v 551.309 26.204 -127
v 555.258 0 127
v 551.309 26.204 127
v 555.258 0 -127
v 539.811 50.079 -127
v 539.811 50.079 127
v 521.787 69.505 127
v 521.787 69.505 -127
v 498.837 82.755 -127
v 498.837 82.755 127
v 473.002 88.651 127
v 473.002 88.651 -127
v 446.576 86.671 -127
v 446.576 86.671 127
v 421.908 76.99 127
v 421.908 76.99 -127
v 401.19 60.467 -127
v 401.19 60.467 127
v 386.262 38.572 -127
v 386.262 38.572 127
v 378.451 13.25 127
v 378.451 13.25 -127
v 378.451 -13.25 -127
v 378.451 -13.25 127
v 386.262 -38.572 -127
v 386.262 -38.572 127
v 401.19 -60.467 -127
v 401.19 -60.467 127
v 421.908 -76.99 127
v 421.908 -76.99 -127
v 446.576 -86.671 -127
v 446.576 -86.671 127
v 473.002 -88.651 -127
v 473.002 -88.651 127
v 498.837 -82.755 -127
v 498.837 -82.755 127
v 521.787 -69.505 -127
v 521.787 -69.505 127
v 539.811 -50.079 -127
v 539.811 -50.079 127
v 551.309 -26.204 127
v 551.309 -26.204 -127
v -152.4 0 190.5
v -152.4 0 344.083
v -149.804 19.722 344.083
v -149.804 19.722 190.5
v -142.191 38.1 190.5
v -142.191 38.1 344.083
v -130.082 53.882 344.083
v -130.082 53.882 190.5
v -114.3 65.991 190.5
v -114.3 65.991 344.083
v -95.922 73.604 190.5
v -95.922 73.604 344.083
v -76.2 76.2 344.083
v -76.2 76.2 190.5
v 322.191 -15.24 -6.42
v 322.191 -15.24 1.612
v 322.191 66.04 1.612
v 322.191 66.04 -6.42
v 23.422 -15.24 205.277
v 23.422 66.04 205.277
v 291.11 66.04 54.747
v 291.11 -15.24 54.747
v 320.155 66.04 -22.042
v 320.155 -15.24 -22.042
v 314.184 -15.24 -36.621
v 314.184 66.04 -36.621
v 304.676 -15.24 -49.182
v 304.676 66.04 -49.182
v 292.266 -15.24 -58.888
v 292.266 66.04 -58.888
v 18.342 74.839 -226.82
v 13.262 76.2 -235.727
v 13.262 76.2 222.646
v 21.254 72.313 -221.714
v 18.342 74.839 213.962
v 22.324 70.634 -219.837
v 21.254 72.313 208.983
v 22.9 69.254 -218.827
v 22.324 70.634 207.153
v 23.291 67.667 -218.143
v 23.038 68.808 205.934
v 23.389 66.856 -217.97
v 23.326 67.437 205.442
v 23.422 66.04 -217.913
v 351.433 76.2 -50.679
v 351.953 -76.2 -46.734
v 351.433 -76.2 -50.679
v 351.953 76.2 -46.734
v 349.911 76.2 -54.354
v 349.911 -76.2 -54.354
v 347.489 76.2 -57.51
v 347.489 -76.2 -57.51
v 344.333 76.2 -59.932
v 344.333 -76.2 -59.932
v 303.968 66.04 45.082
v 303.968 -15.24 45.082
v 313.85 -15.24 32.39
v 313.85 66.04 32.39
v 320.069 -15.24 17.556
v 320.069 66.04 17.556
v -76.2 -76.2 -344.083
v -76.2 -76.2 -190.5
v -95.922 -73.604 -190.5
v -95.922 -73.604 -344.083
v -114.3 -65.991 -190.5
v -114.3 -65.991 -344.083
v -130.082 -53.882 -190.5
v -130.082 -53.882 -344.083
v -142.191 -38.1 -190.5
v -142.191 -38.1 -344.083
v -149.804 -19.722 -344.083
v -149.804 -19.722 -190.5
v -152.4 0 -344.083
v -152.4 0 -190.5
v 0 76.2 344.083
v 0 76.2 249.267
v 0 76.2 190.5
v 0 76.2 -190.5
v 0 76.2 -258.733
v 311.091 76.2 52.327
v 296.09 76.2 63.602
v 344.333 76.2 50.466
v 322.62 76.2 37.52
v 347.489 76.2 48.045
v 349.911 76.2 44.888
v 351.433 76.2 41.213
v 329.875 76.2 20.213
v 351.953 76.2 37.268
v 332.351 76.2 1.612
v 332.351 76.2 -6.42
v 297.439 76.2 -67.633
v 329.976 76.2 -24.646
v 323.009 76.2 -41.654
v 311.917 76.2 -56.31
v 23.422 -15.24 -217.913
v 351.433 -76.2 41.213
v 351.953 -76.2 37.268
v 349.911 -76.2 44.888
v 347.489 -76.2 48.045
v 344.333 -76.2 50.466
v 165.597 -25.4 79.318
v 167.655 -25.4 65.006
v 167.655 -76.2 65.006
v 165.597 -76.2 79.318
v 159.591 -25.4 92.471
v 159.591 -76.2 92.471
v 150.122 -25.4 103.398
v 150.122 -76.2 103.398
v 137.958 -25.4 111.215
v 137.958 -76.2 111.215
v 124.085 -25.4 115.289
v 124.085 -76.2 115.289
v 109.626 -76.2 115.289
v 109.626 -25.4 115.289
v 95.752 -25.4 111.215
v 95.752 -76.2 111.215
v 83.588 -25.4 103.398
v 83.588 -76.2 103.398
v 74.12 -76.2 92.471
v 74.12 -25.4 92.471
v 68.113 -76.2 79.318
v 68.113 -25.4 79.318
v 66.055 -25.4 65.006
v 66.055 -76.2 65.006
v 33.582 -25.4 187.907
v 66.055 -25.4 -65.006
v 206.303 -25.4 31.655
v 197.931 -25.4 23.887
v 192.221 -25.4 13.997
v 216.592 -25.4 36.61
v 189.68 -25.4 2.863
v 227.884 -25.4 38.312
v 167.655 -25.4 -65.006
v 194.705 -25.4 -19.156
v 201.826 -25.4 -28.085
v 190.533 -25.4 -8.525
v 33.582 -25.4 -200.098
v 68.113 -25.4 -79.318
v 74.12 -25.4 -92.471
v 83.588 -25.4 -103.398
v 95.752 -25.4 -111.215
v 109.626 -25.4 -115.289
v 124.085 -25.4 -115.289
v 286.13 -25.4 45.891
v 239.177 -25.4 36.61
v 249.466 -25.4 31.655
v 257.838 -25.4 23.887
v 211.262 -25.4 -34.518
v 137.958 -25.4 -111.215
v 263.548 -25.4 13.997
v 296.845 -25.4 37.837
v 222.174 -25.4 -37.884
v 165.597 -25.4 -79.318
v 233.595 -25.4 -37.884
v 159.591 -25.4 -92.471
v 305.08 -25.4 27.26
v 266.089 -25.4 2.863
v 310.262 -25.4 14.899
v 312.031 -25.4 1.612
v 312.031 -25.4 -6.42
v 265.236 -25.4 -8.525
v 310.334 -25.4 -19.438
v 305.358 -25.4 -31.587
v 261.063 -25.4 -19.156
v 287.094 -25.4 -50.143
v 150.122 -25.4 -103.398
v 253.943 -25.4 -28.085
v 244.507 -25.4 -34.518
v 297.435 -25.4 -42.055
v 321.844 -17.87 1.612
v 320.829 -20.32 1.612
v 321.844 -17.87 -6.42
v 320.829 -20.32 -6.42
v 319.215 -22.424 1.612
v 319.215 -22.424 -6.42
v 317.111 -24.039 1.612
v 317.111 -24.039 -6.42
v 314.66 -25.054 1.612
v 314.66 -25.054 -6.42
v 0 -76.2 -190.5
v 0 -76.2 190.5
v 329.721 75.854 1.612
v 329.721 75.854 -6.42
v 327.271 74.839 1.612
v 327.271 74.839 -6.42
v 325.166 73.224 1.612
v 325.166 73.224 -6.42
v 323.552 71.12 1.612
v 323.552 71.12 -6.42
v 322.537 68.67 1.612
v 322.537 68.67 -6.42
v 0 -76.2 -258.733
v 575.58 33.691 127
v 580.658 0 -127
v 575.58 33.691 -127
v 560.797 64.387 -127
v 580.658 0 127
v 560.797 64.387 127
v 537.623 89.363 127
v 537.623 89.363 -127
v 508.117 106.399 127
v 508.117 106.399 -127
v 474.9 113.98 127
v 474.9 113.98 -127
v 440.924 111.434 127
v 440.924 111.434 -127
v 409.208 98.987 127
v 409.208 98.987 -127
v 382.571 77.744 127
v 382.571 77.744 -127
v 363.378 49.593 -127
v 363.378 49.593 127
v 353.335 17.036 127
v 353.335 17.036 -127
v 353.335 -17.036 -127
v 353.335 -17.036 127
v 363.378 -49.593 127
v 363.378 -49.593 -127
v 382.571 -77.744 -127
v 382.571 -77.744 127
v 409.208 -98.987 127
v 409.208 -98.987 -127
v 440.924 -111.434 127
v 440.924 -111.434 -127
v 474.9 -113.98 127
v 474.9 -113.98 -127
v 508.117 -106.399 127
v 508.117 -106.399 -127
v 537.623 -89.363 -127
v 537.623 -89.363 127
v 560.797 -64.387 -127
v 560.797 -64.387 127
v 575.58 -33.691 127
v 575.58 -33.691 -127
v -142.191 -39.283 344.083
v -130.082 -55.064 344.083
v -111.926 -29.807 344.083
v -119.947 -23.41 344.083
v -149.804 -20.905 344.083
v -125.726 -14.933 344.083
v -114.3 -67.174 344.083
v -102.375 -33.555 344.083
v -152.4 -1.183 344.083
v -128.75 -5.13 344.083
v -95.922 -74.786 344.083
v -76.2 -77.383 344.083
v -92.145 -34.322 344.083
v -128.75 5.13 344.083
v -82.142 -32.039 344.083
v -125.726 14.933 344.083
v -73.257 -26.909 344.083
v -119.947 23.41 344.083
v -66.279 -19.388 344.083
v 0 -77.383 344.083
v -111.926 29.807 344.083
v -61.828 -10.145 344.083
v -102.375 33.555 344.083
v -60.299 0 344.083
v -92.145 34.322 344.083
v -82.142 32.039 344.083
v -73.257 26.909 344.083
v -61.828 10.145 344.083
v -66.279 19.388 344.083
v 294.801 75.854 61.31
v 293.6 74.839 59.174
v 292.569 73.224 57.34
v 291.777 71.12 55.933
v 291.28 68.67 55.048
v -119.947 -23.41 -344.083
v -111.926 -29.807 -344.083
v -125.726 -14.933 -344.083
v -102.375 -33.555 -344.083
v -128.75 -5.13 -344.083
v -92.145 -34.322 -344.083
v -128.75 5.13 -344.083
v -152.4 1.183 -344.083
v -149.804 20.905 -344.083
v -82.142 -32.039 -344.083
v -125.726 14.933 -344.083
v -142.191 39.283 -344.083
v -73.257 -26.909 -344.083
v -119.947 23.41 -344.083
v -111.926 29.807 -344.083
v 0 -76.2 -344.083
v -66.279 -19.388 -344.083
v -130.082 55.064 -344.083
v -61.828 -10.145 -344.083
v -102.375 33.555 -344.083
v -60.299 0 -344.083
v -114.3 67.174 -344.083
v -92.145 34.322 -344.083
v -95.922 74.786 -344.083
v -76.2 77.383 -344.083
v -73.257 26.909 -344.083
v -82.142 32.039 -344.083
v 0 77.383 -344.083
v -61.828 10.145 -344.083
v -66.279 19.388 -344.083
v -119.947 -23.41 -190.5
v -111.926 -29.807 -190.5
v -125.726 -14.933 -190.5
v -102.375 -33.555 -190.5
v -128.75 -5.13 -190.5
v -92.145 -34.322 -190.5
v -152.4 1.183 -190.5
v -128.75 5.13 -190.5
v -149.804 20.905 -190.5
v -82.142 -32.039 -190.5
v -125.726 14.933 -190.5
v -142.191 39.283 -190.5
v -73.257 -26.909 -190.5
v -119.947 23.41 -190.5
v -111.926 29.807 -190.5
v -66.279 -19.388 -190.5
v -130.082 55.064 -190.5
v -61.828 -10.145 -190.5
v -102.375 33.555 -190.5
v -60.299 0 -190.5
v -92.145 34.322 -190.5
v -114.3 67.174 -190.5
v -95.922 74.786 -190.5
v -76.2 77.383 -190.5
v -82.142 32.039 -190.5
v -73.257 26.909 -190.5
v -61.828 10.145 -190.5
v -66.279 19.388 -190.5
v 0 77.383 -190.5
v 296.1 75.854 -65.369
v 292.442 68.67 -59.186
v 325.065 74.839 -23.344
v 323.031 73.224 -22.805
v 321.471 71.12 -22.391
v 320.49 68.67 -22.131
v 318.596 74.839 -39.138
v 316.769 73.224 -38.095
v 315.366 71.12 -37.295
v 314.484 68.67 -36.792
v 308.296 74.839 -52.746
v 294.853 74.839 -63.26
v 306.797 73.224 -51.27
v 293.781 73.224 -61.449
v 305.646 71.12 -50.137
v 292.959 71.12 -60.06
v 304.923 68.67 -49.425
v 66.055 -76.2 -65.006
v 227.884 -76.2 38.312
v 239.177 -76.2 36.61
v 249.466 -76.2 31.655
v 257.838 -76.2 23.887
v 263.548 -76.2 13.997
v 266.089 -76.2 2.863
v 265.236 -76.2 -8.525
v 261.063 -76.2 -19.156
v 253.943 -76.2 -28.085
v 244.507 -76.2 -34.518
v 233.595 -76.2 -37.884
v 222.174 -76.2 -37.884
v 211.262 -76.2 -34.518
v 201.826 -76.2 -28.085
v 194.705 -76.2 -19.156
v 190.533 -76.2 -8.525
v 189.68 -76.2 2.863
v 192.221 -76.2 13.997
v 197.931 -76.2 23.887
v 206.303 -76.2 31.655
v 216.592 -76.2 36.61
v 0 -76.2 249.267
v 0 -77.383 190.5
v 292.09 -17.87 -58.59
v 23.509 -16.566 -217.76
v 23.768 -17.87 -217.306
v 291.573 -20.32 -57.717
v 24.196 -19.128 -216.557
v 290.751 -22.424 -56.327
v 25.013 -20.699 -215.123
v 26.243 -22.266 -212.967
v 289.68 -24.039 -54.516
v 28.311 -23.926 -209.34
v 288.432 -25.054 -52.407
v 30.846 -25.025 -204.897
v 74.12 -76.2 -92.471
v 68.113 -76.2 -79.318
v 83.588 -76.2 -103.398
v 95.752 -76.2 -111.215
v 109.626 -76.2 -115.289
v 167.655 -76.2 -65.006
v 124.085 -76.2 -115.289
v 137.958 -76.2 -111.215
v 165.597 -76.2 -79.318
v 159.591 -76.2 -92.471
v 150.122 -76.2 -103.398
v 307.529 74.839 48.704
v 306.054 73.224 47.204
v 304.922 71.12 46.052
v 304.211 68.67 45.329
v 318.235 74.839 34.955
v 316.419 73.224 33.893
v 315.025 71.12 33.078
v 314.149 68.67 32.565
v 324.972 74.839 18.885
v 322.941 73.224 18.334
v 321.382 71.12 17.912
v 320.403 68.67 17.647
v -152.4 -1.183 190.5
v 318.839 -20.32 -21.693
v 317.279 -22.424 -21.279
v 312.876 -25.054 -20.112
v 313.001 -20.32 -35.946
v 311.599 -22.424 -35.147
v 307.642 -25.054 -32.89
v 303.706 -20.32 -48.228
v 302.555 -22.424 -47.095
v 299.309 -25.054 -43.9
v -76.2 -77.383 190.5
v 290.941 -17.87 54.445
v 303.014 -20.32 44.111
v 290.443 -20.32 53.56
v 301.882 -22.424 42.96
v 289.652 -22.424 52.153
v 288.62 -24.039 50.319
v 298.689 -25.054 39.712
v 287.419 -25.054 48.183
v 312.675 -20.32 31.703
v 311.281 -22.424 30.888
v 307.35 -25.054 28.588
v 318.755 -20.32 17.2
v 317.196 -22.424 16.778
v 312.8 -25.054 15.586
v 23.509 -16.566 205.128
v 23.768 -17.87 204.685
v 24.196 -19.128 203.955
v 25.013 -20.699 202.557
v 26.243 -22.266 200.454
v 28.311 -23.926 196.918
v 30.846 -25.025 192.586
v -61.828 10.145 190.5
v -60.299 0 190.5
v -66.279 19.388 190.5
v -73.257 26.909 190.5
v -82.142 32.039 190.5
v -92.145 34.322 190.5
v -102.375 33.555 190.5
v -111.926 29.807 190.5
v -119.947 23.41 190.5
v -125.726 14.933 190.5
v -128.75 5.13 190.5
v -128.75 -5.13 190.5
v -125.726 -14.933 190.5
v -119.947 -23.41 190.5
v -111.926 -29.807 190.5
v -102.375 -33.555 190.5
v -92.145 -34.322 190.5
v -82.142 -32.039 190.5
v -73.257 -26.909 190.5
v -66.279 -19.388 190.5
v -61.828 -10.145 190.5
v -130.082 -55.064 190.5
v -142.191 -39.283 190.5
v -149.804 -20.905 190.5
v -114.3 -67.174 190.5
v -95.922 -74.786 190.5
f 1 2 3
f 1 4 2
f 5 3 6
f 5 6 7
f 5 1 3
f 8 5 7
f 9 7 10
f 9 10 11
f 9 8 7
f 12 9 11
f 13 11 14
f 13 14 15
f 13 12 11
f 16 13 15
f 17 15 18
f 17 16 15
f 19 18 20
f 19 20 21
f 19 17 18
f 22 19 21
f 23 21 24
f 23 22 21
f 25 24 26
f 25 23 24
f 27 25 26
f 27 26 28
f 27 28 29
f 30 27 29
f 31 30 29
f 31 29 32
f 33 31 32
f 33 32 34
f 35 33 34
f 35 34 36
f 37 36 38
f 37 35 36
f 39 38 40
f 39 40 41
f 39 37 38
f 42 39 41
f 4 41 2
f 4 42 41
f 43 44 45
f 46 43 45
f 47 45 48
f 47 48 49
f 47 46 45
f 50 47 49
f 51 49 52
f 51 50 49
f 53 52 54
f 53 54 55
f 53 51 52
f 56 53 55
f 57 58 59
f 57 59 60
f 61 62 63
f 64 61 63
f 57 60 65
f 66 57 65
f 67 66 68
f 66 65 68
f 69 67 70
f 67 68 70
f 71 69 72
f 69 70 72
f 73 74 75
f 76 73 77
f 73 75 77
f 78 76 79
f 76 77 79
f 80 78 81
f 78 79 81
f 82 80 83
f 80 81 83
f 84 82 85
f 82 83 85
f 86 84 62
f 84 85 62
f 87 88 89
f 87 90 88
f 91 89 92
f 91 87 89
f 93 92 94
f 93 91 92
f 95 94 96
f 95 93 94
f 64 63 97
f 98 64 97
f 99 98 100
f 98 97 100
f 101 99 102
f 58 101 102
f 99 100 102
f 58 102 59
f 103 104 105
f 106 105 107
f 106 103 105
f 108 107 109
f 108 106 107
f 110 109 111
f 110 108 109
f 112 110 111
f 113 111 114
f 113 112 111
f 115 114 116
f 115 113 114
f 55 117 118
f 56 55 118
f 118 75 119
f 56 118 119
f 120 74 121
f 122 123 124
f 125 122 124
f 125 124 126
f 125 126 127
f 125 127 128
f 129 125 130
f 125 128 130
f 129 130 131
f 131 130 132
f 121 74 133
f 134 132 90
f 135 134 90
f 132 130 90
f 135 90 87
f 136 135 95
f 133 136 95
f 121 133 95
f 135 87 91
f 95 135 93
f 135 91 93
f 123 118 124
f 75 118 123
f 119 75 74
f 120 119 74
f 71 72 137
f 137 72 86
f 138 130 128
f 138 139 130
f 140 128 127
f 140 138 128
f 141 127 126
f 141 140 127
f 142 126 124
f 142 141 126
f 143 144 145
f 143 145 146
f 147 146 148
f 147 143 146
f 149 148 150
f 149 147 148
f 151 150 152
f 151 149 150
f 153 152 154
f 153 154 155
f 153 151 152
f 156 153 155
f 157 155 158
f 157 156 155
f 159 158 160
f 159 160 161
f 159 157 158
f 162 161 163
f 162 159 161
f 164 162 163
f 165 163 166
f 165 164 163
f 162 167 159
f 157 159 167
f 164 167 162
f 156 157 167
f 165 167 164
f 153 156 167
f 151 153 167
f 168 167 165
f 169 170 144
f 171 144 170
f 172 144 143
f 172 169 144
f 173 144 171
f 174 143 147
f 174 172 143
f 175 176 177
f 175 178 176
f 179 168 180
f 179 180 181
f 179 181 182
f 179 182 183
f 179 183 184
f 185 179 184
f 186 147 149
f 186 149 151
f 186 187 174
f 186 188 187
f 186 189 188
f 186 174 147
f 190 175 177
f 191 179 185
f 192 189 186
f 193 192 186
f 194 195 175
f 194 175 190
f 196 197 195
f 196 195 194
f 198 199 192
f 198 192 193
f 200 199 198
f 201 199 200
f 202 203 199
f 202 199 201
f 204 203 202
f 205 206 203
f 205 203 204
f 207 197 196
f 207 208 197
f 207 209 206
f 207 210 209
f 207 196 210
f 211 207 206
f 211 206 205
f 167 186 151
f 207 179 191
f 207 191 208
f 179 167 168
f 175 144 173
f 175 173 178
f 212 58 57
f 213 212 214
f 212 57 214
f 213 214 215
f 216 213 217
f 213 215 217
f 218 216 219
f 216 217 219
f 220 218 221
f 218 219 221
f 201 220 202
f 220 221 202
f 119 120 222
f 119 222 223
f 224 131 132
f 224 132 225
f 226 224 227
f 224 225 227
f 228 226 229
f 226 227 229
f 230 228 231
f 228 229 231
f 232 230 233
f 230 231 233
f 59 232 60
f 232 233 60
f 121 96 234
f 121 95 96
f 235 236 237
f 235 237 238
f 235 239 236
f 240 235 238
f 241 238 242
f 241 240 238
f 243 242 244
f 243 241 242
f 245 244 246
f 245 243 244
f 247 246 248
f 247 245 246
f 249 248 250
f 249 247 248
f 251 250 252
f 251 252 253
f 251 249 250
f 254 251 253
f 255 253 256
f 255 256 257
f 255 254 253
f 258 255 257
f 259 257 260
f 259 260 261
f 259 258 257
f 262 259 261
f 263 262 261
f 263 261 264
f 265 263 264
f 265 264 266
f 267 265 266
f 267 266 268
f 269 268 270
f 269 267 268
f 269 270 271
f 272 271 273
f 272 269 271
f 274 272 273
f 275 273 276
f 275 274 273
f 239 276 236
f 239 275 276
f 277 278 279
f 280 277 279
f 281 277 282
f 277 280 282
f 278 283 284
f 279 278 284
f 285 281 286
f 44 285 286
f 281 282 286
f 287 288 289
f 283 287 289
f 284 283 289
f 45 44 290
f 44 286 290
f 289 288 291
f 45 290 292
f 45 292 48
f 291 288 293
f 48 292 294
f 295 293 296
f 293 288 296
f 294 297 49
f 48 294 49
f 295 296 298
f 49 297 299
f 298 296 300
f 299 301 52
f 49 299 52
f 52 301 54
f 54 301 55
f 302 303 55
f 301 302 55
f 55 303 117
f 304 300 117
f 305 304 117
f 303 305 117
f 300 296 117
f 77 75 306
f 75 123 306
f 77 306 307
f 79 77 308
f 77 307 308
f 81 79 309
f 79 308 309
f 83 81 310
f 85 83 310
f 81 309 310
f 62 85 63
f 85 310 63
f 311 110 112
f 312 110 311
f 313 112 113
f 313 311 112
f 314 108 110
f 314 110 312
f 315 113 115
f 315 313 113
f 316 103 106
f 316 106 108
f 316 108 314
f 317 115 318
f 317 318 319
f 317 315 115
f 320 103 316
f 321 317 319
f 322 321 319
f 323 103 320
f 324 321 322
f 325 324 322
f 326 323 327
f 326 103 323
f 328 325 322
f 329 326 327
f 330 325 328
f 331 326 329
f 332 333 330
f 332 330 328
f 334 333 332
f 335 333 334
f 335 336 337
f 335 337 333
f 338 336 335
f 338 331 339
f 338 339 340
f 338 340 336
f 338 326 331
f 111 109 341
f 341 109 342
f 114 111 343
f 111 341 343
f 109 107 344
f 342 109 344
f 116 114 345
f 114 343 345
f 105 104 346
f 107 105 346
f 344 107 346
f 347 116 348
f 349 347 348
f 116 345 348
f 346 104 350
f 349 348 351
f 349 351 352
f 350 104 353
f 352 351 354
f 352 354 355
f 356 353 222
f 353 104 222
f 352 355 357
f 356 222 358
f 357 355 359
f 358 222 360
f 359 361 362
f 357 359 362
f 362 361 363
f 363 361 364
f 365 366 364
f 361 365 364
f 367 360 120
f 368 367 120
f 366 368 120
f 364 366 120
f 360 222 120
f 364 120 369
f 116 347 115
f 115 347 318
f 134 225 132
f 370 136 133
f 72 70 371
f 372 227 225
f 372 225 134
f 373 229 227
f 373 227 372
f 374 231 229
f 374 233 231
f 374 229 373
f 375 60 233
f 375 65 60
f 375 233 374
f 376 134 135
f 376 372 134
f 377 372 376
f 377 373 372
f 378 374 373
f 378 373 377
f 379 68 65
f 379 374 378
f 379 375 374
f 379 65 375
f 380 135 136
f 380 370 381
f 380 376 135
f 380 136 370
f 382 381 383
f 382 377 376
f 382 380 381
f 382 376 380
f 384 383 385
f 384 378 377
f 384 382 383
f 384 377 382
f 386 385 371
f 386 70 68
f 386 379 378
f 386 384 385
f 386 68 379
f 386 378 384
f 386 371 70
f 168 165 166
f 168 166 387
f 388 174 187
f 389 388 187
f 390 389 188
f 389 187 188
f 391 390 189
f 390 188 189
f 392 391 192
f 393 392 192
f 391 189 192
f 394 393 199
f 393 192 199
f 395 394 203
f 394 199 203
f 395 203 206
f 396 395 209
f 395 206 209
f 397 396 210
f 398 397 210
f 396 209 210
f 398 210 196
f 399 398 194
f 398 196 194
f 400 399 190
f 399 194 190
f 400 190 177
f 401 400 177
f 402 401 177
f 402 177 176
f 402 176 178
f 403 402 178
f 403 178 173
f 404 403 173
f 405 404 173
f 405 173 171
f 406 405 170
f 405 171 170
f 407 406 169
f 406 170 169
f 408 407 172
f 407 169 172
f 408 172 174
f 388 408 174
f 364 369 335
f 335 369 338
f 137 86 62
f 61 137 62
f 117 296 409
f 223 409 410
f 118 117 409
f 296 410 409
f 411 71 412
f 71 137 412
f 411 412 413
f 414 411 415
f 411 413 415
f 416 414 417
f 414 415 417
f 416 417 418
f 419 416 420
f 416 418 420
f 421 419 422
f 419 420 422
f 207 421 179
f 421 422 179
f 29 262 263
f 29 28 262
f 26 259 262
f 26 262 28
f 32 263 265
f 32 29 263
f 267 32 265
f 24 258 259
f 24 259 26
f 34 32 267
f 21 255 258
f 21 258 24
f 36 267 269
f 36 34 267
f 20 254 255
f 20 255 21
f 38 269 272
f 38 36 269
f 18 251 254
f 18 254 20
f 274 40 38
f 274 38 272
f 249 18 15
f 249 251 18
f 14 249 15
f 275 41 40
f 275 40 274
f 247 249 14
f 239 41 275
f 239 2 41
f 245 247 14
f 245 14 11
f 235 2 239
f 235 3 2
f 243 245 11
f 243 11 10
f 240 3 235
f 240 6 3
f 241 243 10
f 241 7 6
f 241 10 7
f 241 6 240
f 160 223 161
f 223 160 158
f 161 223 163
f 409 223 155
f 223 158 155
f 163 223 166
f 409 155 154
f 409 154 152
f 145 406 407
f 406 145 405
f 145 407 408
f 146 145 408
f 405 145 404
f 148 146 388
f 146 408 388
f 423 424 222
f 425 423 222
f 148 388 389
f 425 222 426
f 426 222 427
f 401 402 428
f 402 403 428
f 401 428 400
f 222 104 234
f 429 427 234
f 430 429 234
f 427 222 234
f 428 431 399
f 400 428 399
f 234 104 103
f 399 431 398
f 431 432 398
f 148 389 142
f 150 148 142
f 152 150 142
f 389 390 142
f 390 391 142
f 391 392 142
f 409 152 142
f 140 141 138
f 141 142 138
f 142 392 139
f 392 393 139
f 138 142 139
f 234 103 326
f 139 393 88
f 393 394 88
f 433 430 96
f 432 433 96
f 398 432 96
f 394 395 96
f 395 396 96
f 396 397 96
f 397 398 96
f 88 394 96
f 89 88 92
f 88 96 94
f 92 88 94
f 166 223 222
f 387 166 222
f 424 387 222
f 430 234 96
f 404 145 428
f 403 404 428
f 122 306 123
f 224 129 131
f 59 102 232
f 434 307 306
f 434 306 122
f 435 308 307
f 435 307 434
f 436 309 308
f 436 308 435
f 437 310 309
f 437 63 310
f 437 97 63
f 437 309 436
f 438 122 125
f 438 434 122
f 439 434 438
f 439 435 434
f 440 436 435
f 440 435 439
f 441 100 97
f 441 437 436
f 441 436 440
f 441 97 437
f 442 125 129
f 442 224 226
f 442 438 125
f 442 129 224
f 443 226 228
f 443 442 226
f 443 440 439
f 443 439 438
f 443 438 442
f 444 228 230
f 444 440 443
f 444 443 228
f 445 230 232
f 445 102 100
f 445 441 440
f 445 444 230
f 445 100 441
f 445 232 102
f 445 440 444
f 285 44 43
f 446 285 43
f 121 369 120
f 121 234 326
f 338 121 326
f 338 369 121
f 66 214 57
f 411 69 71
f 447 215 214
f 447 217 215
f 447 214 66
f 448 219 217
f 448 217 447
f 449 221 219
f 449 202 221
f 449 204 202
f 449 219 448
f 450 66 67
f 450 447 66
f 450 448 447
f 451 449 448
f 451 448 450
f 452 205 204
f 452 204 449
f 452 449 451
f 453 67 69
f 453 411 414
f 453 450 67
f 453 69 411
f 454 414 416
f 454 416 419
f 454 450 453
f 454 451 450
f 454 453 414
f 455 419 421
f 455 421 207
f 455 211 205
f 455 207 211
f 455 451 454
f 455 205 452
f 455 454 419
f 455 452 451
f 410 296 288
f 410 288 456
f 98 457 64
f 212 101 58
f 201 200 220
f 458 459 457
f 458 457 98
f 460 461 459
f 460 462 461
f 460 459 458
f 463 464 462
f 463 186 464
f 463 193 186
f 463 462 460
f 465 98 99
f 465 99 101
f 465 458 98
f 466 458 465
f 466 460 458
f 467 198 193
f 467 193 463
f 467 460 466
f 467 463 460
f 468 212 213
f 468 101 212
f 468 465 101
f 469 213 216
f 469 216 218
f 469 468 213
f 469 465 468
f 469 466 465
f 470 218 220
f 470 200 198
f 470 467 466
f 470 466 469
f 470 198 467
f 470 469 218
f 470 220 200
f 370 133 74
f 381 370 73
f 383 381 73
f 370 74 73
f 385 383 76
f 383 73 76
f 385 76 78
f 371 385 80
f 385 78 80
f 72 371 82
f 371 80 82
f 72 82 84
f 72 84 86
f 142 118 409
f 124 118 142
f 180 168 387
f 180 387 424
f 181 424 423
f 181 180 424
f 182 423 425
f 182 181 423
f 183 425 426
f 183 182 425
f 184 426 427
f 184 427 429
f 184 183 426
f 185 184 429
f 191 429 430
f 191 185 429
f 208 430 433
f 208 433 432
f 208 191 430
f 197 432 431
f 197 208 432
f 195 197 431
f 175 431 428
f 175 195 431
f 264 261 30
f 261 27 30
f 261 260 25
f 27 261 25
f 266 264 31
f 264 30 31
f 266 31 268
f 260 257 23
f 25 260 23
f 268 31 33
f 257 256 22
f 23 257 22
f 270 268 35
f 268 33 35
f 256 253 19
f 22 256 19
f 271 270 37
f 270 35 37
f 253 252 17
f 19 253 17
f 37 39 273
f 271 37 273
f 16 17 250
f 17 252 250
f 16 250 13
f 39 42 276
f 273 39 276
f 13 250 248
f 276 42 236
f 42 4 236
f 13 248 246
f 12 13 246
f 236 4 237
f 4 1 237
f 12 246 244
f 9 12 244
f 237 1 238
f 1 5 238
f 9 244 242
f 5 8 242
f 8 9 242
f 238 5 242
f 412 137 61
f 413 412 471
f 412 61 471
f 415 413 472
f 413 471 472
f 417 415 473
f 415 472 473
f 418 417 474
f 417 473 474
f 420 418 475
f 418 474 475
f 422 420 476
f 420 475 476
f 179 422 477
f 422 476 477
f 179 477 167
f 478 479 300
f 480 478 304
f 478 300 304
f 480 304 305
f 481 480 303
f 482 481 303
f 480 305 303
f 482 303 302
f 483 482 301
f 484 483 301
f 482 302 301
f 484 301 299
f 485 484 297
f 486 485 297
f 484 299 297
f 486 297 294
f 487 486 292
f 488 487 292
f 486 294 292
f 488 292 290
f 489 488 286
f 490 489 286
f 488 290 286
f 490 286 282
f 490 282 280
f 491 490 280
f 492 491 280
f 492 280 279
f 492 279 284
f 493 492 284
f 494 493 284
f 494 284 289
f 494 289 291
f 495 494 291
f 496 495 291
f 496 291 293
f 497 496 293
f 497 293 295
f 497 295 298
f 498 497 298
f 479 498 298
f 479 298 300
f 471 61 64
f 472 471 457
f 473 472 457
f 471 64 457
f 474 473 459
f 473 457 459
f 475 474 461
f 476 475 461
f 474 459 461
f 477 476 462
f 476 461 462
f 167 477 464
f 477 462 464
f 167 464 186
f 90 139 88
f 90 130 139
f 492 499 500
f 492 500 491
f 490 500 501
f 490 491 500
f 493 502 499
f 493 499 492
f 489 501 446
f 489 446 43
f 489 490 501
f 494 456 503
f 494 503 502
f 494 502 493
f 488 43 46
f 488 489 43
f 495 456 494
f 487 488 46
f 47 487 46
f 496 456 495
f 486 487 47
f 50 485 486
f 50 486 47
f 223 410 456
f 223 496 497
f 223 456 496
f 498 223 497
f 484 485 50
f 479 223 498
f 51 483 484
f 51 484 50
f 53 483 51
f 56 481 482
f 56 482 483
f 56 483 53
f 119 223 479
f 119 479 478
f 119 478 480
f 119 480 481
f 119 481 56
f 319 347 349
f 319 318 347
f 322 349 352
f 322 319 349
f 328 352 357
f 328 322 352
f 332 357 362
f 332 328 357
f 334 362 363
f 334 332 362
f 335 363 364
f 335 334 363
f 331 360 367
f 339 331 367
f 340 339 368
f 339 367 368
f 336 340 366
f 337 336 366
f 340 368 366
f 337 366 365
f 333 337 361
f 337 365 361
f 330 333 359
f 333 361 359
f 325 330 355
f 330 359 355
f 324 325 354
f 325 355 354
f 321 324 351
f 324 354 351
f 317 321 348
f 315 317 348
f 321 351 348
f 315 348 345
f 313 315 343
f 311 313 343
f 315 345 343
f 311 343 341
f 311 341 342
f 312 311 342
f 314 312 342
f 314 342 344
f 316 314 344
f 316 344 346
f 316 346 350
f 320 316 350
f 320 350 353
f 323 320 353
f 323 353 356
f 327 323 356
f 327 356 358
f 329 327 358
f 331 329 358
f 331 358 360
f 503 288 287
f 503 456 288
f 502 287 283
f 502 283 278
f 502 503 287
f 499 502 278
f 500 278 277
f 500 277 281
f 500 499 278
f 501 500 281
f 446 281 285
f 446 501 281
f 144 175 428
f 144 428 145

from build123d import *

# Parameters (mm, degrees)
BOSS_EXTRUDE1_DEPTH = 76.2
CUT_EXTRUDE1_DEPTH  = 101.6
SKETCH4_R           = 38.311860733
CUT_EXTRUDE2_DEPTH  = 50.8
FILLET1_R           = 10.16
SKETCH5_R           = 114.3
SKETCH5_R_2         = 88.9
BOSS_EXTRUDE2_DEPTH = 127
FILLET2_R           = 15.24
SKETCH7_W           = 153.582797675
SKETCH7_H           = 153.582797675
BOSS_EXTRUDE3_DEPTH = 152.4
SKETCH8_R           = 34.418137162
CUT_EXTRUDE3_DEPTH  = 778.002
FILLET3_R           = 76.2


with BuildPart() as part:
    # Sketch2 → Boss-Extrude1 (new, symmetric)
    with BuildSketch(Plane(origin=(0, 0, 0), x_dir=(1, 0, 0), z_dir=(0, 1, 0))):
        Polygon((351.952724098, -46.067080745), (351.952724098, 55.532919255), (0, 258.732919255), (0, -249.267080745), align=None)
    extrude(amount=BOSS_EXTRUDE1_DEPTH, both=True)

    # Sketch3 → Cut-Extrude1 (cut)
    with BuildSketch(Plane(origin=(0, 76.2, 0), x_dir=(1, 0, 0), z_dir=(0, 1, 0))):
        with BuildLine():
            Line((23.422147566, 217.912574818), (23.422147566, -205.276778605))
            Line((23.422147566, -205.276778605), (291.110294463, -54.746573984))
            ThreePointArc((291.110294463, -54.746573984), (313.849973398, -32.39028517), (322.190661125, -1.611565641))
            Line((322.190661125, -1.611565641), (322.190661125, 6.419861947))
            ThreePointArc((322.190661125, 6.419861947), (314.18370897, 36.620794448), (292.266241049, 58.888084508))
            Line((292.266241049, 58.888084508), (23.422147566, 217.912574818))
        make_face()
    extrude(amount=-CUT_EXTRUDE1_DEPTH, mode=Mode.SUBTRACT)

    # Sketch4 → Cut-Extrude2 (cut)
    with BuildSketch(Plane(origin=(0, -25.4, 0), x_dir=(1, 0, 0), z_dir=(0, 1, 0))):
        with Locations(Location((227.884419444, 0, 0), (0, 0, 270))):
            Circle(SKETCH4_R)
        with BuildLine():
            Line((167.655223077, 65.006150223), (167.655223077, -65.006150223))
            ThreePointArc((167.655223077, -65.006150223), (116.855223077, -115.806150223), (66.055223077, -65.006150223))
            Line((66.055223077, -65.006150223), (66.055223077, 65.006150223))
            ThreePointArc((66.055223077, 65.006150223), (116.855223077, 115.806150223), (167.655223077, 65.006150223))
        make_face()
    extrude(amount=-CUT_EXTRUDE2_DEPTH, mode=Mode.SUBTRACT)

    # Fillet1
    fillet1_edges = [part.edges().sort_by_distance(p)[0] for p in [
        (157.844194307, -25.4, -138.400329663),
        (314.18370897, -25.4, -36.620794448),
        (322.190661125, -25.4, -2.404148153),
        (313.849973398, -25.4, 32.39028517),
        (157.266221015, -25.4, 130.011676294),
        (23.422147566, -25.4, -6.317898106),
        (157.844194307, 76.2, -138.400329663),
        (23.422147566, 76.2, -6.317898106),
        (157.266221015, 76.2, 130.011676294),
        (313.849973398, 76.2, 32.39028517),
        (322.190661125, 76.2, -2.404148153),
        (314.18370897, 76.2, -36.620794448),
    ]]
    fillet(fillet1_edges, radius=FILLET1_R)

    # Fillet2
    fillet2_edges = [part.edges().sort_by_distance(p)[0] for p in [
        (351.952724098, 0, -55.532919255),
        (351.952724098, 0, 46.067080745),
    ]]
    fillet(fillet2_edges, radius=FILLET2_R)

    # Sketch7 → Boss-Extrude3 (add)
    with BuildSketch(Plane(origin=(0, 0, 0), x_dir=(0, 0, -1), z_dir=(1, 0, 0))):
        with Locations((-267.291398837, -0.591398838)):
            Rectangle(SKETCH7_W, SKETCH7_H)
        with Locations((267.291398837, 0.591398838)):
            Rectangle(SKETCH7_W, SKETCH7_H)
    extrude(amount=-BOSS_EXTRUDE3_DEPTH)

    # Sketch8 → Cut-Extrude3 (cut)
    with BuildSketch(Plane.XY.offset(344.082797675)):
        with Locations((-94.716643382, 0)):
            Circle(SKETCH8_R)
    extrude(amount=-CUT_EXTRUDE3_DEPTH, mode=Mode.SUBTRACT)

    # Fillet3
    fillet3_edges = [part.edges().sort_by_distance(p)[0] for p in [
        (-152.4, -77.382797675, 267.291398837),
        (-152.4, 76.2, 267.291398837),
        (-152.4, -76.2, -267.291398837),
        (-152.4, 77.382797675, -267.291398837),
    ]]
    fillet(fillet3_edges, radius=FILLET3_R)


with BuildPart() as body_2:
    # Sketch5 → Boss-Extrude2 (new, symmetric)
    with BuildSketch(Plane.XY):
        with Locations((466.358385684, 0)):
            Circle(SKETCH5_R)
        with Locations((466.358385684, 0)):
            Circle(SKETCH5_R_2, mode=Mode.SUBTRACT)
    extrude(amount=BOSS_EXTRUDE2_DEPTH, both=True)


solid = Compound([part.part, body_2.part])
